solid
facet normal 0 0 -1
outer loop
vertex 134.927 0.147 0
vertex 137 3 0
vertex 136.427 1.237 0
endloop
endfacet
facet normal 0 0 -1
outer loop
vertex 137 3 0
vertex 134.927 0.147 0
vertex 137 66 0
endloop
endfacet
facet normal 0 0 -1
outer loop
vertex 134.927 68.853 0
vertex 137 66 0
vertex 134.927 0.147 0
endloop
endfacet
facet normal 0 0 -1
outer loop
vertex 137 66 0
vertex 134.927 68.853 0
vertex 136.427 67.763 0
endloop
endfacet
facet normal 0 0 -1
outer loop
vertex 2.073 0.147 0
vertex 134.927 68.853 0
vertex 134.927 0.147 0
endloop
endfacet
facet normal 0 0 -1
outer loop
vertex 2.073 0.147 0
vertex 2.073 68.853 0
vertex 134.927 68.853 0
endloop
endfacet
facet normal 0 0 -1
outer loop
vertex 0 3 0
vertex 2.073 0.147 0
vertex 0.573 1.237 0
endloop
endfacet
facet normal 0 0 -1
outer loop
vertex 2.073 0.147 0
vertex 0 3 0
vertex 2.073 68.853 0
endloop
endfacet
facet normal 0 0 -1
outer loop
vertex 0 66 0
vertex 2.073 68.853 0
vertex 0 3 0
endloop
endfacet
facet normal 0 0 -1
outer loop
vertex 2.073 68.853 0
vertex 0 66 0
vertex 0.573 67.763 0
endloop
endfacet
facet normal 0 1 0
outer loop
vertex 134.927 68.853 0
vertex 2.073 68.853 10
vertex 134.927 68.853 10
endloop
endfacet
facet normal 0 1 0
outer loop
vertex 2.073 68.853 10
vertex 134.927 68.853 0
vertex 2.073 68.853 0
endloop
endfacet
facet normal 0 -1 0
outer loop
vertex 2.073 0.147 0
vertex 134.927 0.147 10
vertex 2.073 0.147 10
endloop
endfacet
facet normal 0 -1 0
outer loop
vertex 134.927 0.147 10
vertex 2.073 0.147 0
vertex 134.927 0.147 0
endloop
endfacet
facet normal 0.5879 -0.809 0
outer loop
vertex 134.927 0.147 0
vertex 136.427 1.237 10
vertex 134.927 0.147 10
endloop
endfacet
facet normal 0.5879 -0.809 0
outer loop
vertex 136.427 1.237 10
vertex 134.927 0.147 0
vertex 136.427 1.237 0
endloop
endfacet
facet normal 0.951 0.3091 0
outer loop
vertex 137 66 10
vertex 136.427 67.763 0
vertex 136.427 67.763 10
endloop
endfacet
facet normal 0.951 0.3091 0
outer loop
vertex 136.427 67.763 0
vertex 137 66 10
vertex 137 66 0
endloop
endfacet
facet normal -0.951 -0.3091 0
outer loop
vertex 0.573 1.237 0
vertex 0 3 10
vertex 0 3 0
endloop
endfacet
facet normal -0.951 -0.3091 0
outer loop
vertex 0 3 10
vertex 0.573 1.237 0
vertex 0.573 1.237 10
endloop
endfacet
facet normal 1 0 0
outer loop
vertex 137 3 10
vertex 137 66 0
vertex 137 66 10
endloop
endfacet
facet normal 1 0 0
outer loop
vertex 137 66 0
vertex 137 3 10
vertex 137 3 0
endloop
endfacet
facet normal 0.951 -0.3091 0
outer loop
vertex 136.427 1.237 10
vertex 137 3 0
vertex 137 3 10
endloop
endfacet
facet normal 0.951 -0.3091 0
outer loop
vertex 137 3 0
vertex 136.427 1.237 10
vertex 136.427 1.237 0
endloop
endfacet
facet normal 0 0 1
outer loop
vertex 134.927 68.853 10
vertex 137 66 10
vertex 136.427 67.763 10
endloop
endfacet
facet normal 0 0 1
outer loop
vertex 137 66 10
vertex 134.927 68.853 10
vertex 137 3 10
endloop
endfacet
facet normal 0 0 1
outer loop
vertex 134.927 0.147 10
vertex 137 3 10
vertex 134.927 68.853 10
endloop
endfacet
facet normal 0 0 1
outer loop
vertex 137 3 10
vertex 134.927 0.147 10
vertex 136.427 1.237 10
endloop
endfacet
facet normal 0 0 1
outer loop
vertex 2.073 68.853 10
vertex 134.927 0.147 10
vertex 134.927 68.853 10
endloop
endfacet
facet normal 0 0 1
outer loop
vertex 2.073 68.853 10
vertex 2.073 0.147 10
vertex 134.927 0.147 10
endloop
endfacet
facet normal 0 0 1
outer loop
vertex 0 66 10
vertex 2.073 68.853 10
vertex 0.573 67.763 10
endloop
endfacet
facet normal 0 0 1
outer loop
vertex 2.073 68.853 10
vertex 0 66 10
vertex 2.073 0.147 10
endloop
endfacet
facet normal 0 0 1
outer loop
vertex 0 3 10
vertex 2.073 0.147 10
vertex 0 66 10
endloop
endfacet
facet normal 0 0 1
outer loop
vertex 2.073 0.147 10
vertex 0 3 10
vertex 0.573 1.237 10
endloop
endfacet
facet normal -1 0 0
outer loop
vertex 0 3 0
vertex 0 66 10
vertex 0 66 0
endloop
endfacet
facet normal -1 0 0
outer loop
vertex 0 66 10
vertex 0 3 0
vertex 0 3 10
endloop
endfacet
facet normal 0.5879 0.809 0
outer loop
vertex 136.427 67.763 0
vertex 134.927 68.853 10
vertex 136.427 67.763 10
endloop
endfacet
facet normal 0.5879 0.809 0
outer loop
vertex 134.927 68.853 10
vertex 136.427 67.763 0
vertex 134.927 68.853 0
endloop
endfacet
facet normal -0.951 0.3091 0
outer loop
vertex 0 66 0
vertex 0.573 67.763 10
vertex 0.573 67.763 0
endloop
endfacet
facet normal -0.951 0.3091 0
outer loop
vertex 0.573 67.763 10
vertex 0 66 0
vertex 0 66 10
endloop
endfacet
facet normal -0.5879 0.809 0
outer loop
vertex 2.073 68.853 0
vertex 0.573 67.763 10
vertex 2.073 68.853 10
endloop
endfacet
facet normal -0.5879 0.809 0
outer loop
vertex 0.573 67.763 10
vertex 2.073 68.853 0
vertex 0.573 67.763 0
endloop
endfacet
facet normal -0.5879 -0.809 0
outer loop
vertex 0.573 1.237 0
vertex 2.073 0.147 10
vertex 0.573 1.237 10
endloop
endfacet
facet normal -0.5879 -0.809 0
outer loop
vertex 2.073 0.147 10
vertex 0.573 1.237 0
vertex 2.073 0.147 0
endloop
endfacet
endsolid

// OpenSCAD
// Melentii Evghenii

module phone(clr){
    body(clr, 137, 69, 10, 3);
    translate([13, 24, 9]) rotate([0, 0, 90]) color("White") logo("lenovo", 5, ":style=Bold");
    screen("White");
    rear_camera(10,10);
}

module body(clr, height, width, thickness, radius){
    color(clr) hull(){ 
        translate([radius, radius, 0]) cylinder(h=thickness, r=radius);
        translate([height-radius, radius, 0]) cylinder(h=thickness, r=radius);
        translate([radius, width-radius, 0]) cylinder(h=thickness, r=radius);
        translate([height-radius, width-radius, 0]) cylinder(h=thickness, r=radius);
    } 
}

module screen(clr){
    translate([15, 5, 9]) color(clr) cube([105, 60, 1]);
}

module logo(txt, s, style = "") {
    linear_extrude(height = 1)
      text(txt, size = s, font = str("Liberation Sans", style), $fn = 16);
}

module rear_camera(height, width){
    translate([10, 29, 0]) body("Black", height, width, 2, 2);
    color("White") translate([15, 34, 0]) cylinder(2, 2);
}

phone("Silver");
